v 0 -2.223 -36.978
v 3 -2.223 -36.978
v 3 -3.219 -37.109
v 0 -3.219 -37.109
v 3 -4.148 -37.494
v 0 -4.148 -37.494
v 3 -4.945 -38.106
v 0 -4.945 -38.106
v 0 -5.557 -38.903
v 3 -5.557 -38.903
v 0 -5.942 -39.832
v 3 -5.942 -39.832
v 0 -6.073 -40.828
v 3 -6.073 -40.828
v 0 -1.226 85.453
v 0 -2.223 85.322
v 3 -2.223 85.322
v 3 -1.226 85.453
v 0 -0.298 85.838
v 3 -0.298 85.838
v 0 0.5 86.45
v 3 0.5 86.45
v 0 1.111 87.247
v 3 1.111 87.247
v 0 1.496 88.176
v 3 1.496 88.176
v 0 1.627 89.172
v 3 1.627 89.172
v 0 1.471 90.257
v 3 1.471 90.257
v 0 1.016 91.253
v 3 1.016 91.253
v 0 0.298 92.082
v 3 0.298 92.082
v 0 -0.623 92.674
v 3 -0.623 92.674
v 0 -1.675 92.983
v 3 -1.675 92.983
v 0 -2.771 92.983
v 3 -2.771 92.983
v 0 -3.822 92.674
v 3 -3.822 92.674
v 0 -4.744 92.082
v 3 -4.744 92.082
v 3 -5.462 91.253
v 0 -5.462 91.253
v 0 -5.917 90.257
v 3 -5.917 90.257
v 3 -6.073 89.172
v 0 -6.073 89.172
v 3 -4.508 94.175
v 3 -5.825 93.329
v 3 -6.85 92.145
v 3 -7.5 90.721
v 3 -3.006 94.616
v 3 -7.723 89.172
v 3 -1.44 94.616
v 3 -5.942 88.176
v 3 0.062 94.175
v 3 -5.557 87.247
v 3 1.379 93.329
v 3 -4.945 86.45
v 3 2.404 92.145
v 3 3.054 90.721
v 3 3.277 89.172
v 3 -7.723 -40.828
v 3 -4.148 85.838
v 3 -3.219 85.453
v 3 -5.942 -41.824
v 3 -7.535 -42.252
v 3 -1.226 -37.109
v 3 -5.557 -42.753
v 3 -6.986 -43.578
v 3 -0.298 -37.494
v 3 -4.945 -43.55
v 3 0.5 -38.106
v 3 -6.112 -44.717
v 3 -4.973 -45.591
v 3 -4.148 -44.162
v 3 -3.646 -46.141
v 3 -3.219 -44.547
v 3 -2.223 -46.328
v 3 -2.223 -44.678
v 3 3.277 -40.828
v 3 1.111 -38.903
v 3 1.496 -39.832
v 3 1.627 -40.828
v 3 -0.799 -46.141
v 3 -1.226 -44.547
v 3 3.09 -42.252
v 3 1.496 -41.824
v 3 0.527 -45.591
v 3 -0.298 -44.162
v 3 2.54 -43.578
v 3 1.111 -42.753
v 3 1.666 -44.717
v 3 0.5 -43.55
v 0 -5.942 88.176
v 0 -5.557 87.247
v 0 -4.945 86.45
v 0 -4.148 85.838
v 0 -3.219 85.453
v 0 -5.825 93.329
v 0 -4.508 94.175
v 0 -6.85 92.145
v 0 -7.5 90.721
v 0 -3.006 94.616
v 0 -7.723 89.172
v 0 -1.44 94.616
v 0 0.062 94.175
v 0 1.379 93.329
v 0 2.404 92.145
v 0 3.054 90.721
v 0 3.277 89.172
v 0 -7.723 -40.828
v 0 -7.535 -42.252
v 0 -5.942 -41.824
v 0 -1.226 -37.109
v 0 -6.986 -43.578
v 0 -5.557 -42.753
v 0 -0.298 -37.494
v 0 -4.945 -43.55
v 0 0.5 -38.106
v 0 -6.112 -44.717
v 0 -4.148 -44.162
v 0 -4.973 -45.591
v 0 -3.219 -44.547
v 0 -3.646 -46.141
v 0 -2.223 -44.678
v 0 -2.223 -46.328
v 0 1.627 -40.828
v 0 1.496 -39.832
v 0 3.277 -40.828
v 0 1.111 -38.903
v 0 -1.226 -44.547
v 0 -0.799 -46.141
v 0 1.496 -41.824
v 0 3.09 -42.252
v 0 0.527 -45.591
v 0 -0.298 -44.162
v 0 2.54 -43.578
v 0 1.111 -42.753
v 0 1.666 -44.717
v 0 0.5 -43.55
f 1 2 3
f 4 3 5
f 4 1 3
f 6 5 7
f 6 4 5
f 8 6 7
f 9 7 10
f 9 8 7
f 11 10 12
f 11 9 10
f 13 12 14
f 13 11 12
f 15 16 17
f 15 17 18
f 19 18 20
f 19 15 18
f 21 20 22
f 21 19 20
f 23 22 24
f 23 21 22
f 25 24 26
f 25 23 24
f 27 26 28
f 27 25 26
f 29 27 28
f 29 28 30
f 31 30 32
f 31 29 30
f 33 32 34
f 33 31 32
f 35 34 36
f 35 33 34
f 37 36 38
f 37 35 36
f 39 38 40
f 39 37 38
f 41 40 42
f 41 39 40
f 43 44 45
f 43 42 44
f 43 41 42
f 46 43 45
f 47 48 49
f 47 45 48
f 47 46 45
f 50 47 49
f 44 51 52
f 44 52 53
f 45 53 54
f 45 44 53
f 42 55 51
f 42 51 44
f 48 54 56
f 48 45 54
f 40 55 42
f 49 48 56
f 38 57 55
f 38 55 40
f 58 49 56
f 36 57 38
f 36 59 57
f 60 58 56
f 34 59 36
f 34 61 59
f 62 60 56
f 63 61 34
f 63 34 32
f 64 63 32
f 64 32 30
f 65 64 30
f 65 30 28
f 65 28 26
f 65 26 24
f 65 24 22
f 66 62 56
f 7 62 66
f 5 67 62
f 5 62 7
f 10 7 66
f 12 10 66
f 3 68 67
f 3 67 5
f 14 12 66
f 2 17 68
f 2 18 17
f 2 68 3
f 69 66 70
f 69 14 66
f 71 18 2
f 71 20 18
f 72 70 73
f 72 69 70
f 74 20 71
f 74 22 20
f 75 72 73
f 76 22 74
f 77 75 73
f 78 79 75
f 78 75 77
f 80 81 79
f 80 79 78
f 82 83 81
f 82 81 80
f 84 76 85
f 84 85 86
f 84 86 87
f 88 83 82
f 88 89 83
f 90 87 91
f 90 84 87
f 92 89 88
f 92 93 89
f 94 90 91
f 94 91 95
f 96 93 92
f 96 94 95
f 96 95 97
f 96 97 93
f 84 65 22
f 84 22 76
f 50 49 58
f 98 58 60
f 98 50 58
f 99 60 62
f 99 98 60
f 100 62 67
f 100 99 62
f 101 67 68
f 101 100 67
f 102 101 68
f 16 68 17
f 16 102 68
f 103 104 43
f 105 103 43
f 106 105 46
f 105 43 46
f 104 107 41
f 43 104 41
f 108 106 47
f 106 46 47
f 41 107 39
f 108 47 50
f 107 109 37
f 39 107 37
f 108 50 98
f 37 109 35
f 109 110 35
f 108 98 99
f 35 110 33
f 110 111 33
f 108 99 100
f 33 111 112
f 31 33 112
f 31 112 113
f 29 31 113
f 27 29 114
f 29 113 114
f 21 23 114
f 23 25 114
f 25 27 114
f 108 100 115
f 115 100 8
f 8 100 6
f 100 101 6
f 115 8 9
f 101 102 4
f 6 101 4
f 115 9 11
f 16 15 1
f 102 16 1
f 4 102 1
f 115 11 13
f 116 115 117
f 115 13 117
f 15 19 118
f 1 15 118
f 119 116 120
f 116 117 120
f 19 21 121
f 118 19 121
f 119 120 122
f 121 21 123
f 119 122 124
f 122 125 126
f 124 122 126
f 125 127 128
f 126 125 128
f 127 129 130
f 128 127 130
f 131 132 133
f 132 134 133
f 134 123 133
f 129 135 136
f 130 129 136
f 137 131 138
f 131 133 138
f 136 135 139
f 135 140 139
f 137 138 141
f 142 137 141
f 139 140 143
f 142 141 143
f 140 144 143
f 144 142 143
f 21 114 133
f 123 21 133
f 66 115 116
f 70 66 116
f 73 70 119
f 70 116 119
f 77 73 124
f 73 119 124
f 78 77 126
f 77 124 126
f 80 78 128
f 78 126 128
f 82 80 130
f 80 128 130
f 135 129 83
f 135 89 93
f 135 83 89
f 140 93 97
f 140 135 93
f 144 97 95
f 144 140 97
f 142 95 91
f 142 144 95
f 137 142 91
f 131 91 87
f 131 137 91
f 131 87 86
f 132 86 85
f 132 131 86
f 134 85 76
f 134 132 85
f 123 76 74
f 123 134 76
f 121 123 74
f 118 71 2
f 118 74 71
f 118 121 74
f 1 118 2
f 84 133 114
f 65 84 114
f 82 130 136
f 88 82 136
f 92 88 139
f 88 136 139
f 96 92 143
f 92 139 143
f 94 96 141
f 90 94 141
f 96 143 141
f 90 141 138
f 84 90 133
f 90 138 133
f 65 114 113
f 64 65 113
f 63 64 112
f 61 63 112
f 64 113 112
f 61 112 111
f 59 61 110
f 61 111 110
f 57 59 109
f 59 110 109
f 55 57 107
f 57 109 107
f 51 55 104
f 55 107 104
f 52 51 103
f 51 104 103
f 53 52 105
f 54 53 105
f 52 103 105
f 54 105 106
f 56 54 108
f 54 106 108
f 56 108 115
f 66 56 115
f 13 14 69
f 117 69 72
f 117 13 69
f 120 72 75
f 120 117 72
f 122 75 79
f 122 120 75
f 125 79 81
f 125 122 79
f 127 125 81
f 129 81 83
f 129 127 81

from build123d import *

# Parameters (mm, degrees)
BOSS_EXTRUDE3_DEPTH = 3
SKETCH1_7_R         = 3.85
CUT_EXTRUDE2_DEPTH  = 96.033790624


with BuildPart() as part:
    # Sketch1 → Boss-Extrude3 (new body)
    with BuildSketch(Plane(origin=(0, 0, 0), x_dir=(0, 0, -1), z_dir=(1, 0, 0))):
        with BuildLine():
            ThreePointArc((-89.17195507, 3.277158319), (-94.67195507, -2.222841681), (-89.17195507, -7.722841681))
            Line((-89.17195507, -7.722841681), (40.82804493, -7.722841681))
            ThreePointArc((40.82804493, -7.722841681), (46.32804493, -2.222841681), (40.82804493, 3.277158319))
            Line((40.82804493, 3.277158319), (-89.17195507, 3.277158319))
        make_face()
    extrude(amount=BOSS_EXTRUDE3_DEPTH)

    # Sketch1<7> → Cut-Extrude2 (cut, through all)
    with BuildSketch(Plane(origin=(0, 0, 0), x_dir=(0, 0, -1), z_dir=(1, 0, 0))):
        with Locations((-89.17195507, -2.222841681)):
            Circle(SKETCH1_7_R)
        with Locations((40.82804493, -2.222841681)):
            Circle(SKETCH1_7_R)
    extrude(amount=CUT_EXTRUDE2_DEPTH, mode=Mode.SUBTRACT)


solid = part.part
